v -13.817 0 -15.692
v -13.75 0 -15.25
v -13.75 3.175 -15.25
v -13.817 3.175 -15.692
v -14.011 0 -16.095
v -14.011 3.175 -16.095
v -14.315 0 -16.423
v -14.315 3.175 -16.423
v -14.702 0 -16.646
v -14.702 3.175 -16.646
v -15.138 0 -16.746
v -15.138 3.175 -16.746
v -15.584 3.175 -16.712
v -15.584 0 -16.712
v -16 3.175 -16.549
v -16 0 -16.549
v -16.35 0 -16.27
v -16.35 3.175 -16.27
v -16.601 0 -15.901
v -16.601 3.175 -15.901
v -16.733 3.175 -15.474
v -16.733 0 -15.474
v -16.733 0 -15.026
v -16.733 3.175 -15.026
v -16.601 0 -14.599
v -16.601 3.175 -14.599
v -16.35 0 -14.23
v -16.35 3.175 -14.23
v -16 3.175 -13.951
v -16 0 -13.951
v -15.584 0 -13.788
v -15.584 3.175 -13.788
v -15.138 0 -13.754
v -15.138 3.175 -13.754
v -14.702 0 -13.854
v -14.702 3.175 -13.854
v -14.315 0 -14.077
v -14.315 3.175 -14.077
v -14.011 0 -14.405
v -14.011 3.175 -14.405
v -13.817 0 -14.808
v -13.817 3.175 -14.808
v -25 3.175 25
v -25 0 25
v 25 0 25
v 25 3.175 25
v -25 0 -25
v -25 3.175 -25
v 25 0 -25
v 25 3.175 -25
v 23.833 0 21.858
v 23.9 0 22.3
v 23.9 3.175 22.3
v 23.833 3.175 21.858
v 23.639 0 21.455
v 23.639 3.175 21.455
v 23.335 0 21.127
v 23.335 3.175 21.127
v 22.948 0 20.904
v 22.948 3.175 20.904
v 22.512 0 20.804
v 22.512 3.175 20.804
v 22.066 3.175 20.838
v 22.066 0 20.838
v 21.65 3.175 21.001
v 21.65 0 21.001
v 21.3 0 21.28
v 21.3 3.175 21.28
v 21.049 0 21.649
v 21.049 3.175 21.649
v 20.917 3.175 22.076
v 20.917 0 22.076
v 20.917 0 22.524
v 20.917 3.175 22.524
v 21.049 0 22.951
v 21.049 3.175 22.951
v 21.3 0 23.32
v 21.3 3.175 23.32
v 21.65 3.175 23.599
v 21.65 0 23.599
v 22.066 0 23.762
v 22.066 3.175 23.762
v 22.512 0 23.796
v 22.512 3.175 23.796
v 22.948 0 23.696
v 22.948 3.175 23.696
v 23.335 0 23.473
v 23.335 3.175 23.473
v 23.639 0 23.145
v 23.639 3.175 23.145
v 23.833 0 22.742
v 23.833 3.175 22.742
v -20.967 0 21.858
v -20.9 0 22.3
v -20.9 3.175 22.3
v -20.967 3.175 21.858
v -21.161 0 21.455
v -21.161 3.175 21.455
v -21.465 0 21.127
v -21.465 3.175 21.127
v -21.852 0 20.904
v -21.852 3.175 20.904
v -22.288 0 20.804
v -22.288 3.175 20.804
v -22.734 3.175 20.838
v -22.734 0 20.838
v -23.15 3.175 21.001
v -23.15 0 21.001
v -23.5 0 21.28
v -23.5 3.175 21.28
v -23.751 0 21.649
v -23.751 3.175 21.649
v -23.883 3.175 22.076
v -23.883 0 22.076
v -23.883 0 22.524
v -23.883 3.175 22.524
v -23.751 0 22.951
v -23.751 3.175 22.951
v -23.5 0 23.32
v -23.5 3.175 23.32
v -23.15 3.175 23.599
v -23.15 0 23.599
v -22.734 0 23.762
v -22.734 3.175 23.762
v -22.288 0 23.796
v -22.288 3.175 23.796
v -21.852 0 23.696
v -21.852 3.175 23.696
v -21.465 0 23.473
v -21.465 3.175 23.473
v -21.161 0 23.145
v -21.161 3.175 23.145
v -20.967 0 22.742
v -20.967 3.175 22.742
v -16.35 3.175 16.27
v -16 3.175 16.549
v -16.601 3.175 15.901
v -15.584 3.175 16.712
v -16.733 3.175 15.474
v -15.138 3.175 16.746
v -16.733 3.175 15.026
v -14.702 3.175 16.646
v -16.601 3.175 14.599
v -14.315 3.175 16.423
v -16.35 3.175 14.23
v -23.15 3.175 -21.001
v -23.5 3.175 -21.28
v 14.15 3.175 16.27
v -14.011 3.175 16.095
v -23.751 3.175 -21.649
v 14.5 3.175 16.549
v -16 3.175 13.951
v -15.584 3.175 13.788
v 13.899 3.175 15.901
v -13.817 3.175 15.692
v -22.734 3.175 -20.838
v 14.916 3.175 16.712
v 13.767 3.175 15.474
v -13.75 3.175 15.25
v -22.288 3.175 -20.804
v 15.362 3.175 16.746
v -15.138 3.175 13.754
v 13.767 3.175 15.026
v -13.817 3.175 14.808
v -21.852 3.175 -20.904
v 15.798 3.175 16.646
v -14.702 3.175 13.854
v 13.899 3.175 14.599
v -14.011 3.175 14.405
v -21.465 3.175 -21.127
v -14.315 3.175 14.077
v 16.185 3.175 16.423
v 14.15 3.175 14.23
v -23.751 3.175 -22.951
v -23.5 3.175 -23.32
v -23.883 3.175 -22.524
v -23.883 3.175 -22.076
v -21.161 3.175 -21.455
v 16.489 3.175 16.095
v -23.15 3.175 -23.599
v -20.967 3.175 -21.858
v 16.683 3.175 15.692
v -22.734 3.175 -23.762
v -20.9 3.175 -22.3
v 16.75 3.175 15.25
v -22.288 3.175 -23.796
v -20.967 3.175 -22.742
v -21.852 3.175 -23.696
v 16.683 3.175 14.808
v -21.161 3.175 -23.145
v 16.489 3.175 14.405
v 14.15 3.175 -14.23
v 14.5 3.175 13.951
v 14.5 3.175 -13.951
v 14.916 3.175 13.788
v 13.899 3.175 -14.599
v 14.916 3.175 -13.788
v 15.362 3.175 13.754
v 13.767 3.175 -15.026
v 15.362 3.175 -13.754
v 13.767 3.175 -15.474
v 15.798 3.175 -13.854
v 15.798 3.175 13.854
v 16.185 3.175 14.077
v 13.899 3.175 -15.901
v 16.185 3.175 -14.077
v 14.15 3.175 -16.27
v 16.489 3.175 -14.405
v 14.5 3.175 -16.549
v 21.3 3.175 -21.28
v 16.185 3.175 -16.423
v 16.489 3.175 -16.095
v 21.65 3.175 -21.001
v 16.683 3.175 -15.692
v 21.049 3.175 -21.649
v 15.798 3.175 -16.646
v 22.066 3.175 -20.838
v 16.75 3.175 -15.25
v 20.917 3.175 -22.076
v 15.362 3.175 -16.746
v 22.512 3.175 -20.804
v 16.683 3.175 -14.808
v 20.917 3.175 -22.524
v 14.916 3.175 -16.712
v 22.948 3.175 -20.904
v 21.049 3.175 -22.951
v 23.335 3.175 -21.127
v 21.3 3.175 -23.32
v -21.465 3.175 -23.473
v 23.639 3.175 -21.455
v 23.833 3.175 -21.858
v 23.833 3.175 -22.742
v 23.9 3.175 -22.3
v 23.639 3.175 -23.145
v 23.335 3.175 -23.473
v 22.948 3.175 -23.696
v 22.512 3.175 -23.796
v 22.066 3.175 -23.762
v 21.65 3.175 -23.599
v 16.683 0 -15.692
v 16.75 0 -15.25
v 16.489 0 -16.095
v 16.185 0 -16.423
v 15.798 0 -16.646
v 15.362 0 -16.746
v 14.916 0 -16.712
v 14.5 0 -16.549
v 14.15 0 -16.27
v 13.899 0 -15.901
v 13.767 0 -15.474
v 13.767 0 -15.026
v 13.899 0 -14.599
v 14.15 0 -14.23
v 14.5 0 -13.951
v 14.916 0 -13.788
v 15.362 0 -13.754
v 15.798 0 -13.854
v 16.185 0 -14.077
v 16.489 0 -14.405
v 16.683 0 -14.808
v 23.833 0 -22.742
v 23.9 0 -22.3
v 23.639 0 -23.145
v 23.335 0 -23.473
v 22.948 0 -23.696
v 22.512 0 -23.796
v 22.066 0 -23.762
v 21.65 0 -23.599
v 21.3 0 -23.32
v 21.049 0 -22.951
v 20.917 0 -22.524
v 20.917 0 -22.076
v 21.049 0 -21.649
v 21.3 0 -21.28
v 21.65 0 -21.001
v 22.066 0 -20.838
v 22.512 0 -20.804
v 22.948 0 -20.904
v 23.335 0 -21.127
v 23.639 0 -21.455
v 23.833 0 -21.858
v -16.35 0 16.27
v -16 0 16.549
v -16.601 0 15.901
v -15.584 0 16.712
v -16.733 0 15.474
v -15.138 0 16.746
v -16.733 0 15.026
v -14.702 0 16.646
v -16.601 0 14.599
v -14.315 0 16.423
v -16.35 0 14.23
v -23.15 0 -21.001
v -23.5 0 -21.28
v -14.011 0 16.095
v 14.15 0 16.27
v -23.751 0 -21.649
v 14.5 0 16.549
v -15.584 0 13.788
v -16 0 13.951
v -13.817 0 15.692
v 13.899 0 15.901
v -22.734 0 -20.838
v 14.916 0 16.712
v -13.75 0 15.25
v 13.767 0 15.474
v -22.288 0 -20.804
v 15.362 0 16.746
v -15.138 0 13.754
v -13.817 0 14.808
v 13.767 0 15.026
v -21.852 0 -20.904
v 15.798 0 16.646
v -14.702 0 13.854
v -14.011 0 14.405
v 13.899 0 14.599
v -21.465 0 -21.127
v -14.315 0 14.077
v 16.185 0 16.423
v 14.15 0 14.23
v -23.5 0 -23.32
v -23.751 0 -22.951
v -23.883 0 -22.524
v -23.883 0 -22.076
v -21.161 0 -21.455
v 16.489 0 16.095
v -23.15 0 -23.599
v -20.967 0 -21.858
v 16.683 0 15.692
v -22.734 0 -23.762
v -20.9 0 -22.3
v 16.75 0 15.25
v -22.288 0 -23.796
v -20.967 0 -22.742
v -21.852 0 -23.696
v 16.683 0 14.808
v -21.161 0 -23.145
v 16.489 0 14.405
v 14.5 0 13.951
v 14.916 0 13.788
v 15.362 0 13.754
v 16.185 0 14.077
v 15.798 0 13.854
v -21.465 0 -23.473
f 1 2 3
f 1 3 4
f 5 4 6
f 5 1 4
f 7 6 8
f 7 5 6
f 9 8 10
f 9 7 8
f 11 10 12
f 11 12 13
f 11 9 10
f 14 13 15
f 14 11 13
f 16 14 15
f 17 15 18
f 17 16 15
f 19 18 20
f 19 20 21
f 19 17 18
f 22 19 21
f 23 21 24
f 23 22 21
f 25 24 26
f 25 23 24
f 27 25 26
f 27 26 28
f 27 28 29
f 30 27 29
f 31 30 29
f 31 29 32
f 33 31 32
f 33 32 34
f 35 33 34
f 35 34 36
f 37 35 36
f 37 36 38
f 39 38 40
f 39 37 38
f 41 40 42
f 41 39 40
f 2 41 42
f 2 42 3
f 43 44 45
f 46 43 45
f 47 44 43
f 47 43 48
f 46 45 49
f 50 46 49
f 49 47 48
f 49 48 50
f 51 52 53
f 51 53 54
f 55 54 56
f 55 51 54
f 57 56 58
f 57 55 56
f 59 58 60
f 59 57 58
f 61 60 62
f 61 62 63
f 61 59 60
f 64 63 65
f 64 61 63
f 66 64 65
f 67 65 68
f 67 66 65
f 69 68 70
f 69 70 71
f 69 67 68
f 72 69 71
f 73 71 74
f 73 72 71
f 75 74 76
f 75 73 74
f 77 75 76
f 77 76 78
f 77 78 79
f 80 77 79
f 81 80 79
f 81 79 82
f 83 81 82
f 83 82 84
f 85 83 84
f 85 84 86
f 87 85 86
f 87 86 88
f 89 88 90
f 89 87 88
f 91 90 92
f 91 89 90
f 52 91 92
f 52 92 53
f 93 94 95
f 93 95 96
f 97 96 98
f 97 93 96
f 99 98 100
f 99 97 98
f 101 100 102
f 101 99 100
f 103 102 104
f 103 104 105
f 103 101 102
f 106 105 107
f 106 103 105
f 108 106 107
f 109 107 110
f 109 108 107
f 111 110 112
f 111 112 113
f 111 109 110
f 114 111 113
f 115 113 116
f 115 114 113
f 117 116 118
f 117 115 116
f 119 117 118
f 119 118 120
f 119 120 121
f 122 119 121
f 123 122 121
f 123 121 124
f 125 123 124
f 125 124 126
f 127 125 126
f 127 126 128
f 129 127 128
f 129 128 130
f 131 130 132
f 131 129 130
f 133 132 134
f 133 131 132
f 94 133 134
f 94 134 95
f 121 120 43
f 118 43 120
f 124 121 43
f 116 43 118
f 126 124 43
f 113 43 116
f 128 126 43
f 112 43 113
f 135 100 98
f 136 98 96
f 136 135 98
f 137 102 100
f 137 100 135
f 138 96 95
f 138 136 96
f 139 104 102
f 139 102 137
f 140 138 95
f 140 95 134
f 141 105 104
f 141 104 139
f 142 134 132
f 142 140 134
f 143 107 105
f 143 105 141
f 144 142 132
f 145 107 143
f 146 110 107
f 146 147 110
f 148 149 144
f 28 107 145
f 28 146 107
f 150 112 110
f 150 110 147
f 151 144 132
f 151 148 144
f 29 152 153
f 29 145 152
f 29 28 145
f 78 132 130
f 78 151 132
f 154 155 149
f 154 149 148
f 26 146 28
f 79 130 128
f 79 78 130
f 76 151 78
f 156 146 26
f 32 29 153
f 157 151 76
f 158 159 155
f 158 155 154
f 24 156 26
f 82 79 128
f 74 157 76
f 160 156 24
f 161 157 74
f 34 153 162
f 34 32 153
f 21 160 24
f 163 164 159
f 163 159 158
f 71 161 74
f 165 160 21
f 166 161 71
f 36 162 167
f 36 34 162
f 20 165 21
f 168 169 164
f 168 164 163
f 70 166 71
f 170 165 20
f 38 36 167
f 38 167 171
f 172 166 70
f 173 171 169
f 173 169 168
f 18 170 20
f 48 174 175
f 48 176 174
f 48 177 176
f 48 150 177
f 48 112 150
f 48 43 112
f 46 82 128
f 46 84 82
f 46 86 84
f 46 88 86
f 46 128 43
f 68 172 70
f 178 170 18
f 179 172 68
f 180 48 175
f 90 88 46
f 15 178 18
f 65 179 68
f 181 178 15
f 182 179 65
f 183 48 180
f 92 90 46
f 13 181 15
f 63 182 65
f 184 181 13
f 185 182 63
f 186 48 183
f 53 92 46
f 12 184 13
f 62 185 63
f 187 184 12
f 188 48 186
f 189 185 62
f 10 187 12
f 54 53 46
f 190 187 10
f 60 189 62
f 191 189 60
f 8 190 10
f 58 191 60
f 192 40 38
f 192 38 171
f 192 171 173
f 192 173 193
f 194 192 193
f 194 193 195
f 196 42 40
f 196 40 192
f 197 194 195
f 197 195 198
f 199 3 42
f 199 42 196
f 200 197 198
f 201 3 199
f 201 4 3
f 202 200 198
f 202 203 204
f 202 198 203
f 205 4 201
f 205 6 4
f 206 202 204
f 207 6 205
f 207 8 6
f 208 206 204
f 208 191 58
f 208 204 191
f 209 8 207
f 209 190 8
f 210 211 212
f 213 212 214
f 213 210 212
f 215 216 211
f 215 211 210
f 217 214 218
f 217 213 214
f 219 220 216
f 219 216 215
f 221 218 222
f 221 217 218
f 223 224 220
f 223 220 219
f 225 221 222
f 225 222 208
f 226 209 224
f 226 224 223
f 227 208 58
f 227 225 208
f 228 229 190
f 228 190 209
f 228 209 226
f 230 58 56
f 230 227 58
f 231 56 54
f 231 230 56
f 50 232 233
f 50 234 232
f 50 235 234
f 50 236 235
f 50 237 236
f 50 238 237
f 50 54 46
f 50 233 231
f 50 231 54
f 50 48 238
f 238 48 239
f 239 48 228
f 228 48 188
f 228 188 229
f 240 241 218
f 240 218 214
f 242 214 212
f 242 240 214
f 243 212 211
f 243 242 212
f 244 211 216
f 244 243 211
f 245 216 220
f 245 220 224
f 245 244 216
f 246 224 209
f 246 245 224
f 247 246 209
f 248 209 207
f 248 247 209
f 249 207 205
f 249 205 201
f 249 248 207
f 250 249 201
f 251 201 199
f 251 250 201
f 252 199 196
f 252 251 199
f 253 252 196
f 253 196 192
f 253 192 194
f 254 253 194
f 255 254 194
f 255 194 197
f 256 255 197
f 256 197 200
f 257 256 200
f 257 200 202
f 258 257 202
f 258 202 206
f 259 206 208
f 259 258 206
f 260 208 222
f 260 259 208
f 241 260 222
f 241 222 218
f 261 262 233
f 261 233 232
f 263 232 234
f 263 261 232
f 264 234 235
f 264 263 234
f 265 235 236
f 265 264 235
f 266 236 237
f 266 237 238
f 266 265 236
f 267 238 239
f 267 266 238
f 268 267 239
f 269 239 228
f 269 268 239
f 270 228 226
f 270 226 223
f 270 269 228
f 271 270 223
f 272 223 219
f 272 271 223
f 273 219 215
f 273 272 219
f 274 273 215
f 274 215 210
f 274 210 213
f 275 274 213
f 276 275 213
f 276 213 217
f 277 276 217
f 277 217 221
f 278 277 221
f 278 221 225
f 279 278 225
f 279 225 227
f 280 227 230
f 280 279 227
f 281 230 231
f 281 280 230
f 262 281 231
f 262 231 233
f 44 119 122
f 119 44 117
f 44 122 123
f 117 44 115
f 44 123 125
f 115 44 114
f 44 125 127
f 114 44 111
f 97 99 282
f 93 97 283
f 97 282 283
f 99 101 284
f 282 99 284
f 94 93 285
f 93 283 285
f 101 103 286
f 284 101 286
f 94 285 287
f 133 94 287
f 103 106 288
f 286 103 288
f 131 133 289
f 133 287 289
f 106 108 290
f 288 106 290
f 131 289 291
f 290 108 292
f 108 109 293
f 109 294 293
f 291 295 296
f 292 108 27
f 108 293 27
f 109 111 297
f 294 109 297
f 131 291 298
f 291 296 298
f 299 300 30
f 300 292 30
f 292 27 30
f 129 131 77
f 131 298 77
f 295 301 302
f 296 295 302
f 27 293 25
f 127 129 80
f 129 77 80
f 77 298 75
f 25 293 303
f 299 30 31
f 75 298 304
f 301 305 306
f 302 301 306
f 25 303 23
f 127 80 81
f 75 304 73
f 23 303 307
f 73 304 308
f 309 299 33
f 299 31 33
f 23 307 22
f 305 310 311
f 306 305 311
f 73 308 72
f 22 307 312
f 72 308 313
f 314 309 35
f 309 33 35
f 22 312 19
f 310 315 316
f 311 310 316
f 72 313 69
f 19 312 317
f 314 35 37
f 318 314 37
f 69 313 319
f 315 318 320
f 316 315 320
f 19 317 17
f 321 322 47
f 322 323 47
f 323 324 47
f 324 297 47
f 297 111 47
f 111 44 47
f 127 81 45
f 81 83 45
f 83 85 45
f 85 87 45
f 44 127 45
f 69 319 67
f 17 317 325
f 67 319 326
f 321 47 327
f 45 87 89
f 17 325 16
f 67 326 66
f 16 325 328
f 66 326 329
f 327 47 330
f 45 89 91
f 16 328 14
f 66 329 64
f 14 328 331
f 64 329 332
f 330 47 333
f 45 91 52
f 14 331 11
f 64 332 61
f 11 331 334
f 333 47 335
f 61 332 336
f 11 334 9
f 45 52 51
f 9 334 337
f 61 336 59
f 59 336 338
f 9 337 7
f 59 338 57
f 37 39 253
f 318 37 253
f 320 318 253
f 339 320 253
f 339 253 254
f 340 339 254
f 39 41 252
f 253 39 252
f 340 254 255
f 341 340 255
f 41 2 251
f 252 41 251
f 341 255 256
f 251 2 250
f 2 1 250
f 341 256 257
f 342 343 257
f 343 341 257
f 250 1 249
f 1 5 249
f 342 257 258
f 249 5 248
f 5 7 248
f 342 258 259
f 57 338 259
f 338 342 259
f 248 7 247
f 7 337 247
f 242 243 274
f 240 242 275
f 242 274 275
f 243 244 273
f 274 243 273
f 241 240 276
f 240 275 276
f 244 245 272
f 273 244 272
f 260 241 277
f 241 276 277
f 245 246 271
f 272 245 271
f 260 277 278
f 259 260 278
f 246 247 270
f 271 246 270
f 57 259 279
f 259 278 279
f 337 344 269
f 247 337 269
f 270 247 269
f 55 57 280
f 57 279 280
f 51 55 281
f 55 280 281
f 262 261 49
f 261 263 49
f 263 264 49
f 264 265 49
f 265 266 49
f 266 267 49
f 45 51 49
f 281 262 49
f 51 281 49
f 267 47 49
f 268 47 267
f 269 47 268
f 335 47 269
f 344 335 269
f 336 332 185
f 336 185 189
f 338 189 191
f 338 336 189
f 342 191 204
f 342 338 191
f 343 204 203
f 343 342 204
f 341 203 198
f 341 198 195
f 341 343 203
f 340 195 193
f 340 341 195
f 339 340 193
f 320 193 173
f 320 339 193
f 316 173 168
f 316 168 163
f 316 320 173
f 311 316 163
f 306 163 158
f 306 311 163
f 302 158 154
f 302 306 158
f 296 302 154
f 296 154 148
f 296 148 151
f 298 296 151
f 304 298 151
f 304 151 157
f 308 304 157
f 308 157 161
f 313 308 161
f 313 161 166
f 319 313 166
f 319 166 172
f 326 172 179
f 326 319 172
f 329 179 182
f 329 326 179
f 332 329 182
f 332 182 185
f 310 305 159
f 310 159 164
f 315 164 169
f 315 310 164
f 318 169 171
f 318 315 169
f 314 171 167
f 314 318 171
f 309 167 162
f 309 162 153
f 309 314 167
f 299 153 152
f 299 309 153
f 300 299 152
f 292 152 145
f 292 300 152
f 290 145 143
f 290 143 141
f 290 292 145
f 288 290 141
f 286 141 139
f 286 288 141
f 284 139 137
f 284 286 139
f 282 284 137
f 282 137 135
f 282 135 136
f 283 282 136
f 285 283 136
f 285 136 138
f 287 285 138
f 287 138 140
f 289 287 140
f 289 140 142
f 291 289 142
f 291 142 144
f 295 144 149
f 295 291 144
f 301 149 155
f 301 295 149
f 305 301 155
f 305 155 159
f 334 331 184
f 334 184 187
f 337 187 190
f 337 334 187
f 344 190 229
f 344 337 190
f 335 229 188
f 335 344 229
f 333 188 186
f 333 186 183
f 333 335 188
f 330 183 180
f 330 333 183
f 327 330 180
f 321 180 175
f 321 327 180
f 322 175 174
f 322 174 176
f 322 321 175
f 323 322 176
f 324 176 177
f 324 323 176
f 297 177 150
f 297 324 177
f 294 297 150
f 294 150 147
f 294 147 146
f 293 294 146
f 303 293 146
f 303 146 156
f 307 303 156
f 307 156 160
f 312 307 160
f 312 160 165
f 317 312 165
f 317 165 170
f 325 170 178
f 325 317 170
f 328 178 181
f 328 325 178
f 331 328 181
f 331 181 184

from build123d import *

# Parameters (mm, degrees)
SKETCH1_W           = 50
SKETCH1_H           = 50
SKETCH1_R           = 1.5
BOSS_EXTRUDE1_DEPTH = 3.175


with BuildPart() as part:
    # Sketch1 → Boss-Extrude1 (new body)
    with BuildSketch(Plane(origin=(0, 0, 0), x_dir=(1, 0, 0), z_dir=(0, 1, 0))):
        Rectangle(SKETCH1_W, SKETCH1_H)
        with Locations((-22.4, 22.3)):
            Circle(SKETCH1_R, mode=Mode.SUBTRACT)
        with Locations((22.4, 22.3)):
            Circle(SKETCH1_R, mode=Mode.SUBTRACT)
        with Locations((22.4, -22.3)):
            Circle(SKETCH1_R, mode=Mode.SUBTRACT)
        with Locations((-22.4, -22.3)):
            Circle(SKETCH1_R, mode=Mode.SUBTRACT)
        with Locations((-15.25, 15.25)):
            Circle(SKETCH1_R, mode=Mode.SUBTRACT)
        with Locations((15.25, 15.25)):
            Circle(SKETCH1_R, mode=Mode.SUBTRACT)
        with Locations((15.25, -15.25)):
            Circle(SKETCH1_R, mode=Mode.SUBTRACT)
        with Locations((-15.25, -15.25)):
            Circle(SKETCH1_R, mode=Mode.SUBTRACT)
    extrude(amount=BOSS_EXTRUDE1_DEPTH)


solid = part.part
